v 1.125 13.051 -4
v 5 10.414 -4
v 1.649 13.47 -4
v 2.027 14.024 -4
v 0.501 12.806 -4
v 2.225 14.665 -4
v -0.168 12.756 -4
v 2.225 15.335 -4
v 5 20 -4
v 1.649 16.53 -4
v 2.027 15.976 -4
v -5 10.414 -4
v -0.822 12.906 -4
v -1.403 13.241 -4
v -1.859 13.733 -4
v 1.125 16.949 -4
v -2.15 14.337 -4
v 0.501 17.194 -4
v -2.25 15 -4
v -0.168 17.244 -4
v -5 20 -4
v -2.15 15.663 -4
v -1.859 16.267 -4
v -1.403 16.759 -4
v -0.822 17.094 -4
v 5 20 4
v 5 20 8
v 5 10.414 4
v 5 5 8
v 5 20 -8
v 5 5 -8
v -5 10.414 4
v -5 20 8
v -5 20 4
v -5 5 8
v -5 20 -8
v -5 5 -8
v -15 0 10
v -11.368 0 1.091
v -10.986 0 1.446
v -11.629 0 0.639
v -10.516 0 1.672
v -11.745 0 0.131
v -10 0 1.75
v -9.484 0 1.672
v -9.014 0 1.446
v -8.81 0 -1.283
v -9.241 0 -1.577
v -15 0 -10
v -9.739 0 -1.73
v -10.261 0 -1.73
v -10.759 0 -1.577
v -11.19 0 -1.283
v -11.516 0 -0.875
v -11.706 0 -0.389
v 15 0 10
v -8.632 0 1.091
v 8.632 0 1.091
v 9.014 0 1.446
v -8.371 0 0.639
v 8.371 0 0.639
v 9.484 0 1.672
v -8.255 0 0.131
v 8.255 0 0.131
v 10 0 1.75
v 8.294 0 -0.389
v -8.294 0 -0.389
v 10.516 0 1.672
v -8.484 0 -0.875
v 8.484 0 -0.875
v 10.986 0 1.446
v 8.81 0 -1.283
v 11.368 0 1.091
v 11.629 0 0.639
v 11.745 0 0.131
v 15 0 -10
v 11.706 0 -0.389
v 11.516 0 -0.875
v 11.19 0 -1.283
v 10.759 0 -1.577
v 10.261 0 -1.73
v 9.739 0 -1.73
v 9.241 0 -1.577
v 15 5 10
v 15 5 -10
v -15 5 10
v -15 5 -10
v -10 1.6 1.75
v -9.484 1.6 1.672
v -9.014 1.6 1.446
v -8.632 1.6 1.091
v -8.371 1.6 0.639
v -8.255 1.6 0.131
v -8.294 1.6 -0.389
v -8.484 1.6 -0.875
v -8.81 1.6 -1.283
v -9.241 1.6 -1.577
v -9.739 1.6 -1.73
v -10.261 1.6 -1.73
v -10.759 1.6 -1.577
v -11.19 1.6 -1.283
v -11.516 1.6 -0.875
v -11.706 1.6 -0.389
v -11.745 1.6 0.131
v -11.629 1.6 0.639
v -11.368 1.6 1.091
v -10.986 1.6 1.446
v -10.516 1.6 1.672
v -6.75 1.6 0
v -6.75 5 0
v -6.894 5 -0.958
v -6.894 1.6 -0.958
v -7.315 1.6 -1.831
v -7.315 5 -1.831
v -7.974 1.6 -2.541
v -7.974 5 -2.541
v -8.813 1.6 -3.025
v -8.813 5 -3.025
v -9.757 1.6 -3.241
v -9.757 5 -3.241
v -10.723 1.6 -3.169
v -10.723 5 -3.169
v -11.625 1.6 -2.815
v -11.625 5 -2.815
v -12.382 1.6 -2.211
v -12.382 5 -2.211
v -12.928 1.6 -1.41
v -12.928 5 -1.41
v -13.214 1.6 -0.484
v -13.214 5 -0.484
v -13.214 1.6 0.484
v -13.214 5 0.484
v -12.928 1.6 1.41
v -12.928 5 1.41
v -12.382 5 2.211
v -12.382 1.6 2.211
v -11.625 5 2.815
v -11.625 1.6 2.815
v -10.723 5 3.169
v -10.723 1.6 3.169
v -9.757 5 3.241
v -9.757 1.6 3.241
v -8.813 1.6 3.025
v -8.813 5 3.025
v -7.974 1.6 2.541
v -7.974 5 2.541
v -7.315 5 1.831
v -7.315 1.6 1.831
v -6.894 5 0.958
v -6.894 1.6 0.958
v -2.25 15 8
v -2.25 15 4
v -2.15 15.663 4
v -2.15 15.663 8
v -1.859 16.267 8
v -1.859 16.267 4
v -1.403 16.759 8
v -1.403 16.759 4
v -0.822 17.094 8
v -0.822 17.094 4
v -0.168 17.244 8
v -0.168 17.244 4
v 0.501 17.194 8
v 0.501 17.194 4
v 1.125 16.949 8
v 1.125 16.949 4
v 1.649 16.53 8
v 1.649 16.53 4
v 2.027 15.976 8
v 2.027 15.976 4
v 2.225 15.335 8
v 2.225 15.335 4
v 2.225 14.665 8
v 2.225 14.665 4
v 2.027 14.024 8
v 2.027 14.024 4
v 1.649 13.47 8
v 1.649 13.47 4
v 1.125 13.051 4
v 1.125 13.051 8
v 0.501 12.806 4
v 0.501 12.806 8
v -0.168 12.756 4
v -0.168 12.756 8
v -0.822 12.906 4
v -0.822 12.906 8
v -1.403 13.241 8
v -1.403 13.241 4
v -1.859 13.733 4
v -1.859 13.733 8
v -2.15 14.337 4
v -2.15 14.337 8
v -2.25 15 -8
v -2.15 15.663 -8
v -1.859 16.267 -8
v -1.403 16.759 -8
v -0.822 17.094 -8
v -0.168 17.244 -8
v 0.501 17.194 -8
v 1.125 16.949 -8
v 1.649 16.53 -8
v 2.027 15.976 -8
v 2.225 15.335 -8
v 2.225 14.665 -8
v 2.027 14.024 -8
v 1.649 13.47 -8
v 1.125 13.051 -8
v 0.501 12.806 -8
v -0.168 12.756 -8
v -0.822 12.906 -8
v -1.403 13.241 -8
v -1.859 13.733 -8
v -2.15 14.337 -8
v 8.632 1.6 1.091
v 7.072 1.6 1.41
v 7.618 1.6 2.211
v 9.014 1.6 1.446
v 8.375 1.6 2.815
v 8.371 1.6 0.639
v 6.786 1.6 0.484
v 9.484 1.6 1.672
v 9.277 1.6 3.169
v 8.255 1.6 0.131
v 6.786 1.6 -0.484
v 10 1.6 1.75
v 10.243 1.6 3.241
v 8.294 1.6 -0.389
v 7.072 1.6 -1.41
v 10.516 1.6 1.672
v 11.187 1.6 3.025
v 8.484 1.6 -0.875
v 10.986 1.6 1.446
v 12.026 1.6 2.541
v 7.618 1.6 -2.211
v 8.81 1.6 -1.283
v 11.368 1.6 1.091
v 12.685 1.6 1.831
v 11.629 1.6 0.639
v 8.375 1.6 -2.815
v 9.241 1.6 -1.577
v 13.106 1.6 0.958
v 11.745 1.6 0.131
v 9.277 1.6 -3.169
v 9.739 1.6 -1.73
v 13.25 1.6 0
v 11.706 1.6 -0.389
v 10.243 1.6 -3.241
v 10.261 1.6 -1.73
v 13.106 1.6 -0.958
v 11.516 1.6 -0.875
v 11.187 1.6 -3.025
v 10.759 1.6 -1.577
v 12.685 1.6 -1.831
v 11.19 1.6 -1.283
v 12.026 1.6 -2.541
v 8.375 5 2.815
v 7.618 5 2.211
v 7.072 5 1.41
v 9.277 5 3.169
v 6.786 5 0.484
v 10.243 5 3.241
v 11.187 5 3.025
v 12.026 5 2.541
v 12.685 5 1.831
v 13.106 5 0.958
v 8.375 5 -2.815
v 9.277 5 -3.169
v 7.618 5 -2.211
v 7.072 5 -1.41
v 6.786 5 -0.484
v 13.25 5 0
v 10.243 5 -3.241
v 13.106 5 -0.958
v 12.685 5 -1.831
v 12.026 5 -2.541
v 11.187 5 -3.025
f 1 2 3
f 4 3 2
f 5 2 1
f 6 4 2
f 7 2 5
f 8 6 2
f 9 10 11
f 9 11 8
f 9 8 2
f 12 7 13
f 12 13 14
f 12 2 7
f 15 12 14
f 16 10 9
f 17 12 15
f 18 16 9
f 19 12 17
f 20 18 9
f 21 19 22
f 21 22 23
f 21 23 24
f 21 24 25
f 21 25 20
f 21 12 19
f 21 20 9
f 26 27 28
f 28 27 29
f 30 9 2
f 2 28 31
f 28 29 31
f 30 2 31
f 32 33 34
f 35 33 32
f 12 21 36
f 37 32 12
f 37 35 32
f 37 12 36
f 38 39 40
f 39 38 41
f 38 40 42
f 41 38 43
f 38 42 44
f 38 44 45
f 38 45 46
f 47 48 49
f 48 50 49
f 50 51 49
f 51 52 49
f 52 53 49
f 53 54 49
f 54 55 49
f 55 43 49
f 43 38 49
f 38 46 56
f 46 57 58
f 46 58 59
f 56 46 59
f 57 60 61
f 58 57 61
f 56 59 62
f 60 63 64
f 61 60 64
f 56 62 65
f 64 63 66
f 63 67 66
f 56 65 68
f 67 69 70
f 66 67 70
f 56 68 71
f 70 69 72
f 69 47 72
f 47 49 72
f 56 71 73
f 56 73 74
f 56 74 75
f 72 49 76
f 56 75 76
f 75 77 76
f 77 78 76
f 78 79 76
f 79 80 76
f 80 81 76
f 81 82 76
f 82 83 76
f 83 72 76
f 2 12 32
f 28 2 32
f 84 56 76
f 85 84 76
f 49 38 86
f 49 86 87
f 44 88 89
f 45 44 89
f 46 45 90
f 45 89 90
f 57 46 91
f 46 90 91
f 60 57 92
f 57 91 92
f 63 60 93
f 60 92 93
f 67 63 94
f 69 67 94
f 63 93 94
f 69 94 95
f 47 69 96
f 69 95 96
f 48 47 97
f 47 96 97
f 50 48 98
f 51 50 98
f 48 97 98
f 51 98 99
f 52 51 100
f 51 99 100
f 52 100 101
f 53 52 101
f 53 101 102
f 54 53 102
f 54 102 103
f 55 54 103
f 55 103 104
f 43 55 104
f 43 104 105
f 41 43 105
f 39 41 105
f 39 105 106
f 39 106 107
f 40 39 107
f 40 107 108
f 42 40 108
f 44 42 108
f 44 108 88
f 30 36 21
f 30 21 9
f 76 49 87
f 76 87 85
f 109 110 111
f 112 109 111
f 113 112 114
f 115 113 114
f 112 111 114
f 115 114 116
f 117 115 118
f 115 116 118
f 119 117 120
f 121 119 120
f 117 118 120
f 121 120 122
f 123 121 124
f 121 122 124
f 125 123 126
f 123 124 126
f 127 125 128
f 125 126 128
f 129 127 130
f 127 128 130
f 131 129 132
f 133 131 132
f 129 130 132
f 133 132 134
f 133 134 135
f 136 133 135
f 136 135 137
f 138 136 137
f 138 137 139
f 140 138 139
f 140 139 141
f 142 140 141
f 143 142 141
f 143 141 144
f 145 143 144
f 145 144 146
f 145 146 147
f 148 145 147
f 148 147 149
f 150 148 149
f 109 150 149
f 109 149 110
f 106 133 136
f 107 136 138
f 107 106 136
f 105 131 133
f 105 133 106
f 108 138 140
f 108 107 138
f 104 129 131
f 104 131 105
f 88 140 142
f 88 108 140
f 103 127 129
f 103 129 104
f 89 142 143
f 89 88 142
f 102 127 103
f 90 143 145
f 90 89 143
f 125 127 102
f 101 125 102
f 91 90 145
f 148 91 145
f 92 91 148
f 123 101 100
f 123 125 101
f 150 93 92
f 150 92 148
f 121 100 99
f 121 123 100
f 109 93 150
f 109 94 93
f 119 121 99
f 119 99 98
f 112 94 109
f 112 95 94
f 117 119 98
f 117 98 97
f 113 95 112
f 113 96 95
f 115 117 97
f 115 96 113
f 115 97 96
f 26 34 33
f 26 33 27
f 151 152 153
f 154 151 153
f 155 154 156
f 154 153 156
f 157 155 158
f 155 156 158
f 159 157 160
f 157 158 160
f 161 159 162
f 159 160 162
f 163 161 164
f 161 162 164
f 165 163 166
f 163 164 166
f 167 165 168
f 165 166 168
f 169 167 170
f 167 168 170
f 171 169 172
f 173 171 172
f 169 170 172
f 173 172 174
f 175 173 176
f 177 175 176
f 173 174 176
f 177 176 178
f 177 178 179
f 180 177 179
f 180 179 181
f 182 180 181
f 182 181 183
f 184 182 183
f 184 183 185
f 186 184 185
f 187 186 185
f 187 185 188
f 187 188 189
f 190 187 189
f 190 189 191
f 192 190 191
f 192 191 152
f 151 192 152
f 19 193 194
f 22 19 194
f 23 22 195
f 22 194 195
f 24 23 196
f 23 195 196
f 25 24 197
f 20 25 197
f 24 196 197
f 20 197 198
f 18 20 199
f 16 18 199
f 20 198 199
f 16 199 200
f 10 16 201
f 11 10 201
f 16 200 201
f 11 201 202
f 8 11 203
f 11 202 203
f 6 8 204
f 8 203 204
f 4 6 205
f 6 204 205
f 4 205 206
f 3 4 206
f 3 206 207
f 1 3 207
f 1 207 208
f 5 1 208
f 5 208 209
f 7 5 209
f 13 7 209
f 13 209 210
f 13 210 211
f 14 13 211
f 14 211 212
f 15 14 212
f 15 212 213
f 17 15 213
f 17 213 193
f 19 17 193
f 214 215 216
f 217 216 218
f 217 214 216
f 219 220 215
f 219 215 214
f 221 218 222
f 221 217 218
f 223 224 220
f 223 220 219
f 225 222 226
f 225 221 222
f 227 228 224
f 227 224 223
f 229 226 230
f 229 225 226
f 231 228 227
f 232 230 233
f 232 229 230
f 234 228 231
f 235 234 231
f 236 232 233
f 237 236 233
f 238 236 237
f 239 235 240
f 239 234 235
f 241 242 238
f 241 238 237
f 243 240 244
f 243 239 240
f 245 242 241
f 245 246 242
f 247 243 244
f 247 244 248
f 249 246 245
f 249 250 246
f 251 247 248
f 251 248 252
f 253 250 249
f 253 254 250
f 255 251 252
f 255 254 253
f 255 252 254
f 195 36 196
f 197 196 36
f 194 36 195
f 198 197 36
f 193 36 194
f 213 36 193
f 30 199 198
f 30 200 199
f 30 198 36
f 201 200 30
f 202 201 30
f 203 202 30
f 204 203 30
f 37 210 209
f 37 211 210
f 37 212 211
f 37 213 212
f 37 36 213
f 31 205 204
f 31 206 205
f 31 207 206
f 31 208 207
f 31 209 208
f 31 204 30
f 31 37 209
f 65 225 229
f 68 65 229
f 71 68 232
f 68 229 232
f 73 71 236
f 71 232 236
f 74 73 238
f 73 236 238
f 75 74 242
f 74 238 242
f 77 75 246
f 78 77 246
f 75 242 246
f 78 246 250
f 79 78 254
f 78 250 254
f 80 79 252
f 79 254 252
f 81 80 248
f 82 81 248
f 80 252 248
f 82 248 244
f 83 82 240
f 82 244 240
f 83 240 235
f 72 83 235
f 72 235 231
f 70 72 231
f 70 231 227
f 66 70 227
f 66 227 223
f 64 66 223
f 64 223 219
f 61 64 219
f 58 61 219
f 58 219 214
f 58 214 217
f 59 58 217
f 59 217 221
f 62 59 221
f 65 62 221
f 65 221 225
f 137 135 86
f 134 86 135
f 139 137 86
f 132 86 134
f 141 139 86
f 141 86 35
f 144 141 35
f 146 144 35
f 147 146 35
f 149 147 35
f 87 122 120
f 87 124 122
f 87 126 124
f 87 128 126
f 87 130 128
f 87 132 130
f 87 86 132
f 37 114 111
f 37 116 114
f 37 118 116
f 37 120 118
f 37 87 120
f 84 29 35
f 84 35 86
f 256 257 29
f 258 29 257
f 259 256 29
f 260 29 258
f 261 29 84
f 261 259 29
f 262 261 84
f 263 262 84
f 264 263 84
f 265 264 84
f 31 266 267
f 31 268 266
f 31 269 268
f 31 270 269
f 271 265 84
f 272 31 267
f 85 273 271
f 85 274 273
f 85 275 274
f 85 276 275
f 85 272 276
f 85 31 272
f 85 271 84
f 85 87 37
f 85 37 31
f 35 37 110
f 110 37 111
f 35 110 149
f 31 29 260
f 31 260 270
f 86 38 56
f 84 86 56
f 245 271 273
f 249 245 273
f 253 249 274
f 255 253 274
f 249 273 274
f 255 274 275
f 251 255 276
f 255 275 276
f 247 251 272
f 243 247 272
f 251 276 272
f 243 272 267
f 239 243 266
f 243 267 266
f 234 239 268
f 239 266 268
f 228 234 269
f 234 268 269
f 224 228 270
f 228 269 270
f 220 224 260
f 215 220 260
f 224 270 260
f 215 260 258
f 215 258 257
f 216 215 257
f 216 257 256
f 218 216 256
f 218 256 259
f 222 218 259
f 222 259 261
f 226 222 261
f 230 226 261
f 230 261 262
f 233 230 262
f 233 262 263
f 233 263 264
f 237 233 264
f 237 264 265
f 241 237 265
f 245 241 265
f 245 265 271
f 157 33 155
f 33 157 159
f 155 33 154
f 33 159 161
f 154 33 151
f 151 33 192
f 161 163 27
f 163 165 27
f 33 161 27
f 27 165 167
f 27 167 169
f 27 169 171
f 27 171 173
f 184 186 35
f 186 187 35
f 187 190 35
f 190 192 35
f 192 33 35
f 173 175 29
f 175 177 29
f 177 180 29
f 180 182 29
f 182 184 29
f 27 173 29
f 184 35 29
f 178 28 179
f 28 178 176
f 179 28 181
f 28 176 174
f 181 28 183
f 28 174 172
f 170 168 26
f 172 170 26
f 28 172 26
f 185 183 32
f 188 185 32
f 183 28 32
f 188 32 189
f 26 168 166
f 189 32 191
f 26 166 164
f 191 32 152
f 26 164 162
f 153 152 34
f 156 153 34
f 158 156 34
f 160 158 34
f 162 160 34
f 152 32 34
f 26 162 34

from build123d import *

# Parameters (mm, degrees)
SKETCH1_W                                           = 30
SKETCH1_H                                           = 20
BOSS_EXTRUDE1_DEPTH                                 = 5
SKETCH2_W                                           = 10
SKETCH2_H                                           = 16
BOSS_EXTRUDE2_DEPTH                                 = 15
SKETCH3_W                                           = 8
SKETCH3_H                                           = 9.586057572
CUT_EXTRUDE1_DEPTH                                  = 31
SKETCH4_R                                           = 2.25
CUT_EXTRUDE2_DEPTH                                  = 31.805843601
SKETCH5_R                                           = 1.75
CUT_EXTRUDE3_DEPTH                                  = 15
CBORE_FOR_M3_HEX_SOCKET_HEAD_CAP_SCREW1_D           = 3.4
CBORE_FOR_M3_HEX_SOCKET_HEAD_CAP_SCREW1_CBORE_D     = 6.5
CBORE_FOR_M3_HEX_SOCKET_HEAD_CAP_SCREW1_CBORE_DEPTH = 3.4


with BuildPart() as part:
    # Sketch1 → Boss-Extrude1 (new body)
    with BuildSketch(Plane(origin=(0, 0, 0), x_dir=(1, 0, 0), z_dir=(0, 1, 0))):
        Rectangle(SKETCH1_W, SKETCH1_H)
    extrude(amount=BOSS_EXTRUDE1_DEPTH)

    # Sketch2 → Boss-Extrude2 (add)
    with BuildSketch(Plane(origin=(0, 5, 0), x_dir=(1, 0, 0), z_dir=(0, 1, 0))):
        Rectangle(SKETCH2_W, SKETCH2_H)
    extrude(amount=BOSS_EXTRUDE2_DEPTH)

    # Sketch3 → Cut-Extrude1 (cut, through all)
    with BuildSketch(Plane.ZY.offset(5)):
        with Locations((0, 15.206971214)):
            Rectangle(SKETCH3_W, SKETCH3_H)
    extrude(amount=-CUT_EXTRUDE1_DEPTH, mode=Mode.SUBTRACT)

    # Sketch4 → Cut-Extrude2 (cut, through all)
    with BuildSketch(Plane(origin=(0, 0, -8), x_dir=(-1, 0, 0), z_dir=(0, 0, -1))):
        with Locations((0, 15)):
            Circle(SKETCH4_R)
    extrude(amount=-CUT_EXTRUDE2_DEPTH, mode=Mode.SUBTRACT)

    # Sketch5 → Cut-Extrude3 (cut)
    with BuildSketch(Plane(origin=(0, 5, 0), x_dir=(1, 0, 0), z_dir=(0, 1, 0))):
        with Locations(Location((-10, 0, 0), (0, 0, 270))):
            Circle(SKETCH5_R)
        with Locations(Location((10, 0, 0), (0, 0, 270))):
            Circle(SKETCH5_R)
    extrude(amount=-CUT_EXTRUDE3_DEPTH, mode=Mode.SUBTRACT)

    # CBORE for M3 Hex Socket Head Cap Screw1 (through all)
    with Locations(Plane(origin=(0, 5, 0), x_dir=(1, 0, 0), z_dir=(0, 1, 0))):
        with Locations((-10, 0), (10, 0)):
            CounterBoreHole(CBORE_FOR_M3_HEX_SOCKET_HEAD_CAP_SCREW1_D / 2, CBORE_FOR_M3_HEX_SOCKET_HEAD_CAP_SCREW1_CBORE_D / 2, CBORE_FOR_M3_HEX_SOCKET_HEAD_CAP_SCREW1_CBORE_DEPTH)


solid = part.part
